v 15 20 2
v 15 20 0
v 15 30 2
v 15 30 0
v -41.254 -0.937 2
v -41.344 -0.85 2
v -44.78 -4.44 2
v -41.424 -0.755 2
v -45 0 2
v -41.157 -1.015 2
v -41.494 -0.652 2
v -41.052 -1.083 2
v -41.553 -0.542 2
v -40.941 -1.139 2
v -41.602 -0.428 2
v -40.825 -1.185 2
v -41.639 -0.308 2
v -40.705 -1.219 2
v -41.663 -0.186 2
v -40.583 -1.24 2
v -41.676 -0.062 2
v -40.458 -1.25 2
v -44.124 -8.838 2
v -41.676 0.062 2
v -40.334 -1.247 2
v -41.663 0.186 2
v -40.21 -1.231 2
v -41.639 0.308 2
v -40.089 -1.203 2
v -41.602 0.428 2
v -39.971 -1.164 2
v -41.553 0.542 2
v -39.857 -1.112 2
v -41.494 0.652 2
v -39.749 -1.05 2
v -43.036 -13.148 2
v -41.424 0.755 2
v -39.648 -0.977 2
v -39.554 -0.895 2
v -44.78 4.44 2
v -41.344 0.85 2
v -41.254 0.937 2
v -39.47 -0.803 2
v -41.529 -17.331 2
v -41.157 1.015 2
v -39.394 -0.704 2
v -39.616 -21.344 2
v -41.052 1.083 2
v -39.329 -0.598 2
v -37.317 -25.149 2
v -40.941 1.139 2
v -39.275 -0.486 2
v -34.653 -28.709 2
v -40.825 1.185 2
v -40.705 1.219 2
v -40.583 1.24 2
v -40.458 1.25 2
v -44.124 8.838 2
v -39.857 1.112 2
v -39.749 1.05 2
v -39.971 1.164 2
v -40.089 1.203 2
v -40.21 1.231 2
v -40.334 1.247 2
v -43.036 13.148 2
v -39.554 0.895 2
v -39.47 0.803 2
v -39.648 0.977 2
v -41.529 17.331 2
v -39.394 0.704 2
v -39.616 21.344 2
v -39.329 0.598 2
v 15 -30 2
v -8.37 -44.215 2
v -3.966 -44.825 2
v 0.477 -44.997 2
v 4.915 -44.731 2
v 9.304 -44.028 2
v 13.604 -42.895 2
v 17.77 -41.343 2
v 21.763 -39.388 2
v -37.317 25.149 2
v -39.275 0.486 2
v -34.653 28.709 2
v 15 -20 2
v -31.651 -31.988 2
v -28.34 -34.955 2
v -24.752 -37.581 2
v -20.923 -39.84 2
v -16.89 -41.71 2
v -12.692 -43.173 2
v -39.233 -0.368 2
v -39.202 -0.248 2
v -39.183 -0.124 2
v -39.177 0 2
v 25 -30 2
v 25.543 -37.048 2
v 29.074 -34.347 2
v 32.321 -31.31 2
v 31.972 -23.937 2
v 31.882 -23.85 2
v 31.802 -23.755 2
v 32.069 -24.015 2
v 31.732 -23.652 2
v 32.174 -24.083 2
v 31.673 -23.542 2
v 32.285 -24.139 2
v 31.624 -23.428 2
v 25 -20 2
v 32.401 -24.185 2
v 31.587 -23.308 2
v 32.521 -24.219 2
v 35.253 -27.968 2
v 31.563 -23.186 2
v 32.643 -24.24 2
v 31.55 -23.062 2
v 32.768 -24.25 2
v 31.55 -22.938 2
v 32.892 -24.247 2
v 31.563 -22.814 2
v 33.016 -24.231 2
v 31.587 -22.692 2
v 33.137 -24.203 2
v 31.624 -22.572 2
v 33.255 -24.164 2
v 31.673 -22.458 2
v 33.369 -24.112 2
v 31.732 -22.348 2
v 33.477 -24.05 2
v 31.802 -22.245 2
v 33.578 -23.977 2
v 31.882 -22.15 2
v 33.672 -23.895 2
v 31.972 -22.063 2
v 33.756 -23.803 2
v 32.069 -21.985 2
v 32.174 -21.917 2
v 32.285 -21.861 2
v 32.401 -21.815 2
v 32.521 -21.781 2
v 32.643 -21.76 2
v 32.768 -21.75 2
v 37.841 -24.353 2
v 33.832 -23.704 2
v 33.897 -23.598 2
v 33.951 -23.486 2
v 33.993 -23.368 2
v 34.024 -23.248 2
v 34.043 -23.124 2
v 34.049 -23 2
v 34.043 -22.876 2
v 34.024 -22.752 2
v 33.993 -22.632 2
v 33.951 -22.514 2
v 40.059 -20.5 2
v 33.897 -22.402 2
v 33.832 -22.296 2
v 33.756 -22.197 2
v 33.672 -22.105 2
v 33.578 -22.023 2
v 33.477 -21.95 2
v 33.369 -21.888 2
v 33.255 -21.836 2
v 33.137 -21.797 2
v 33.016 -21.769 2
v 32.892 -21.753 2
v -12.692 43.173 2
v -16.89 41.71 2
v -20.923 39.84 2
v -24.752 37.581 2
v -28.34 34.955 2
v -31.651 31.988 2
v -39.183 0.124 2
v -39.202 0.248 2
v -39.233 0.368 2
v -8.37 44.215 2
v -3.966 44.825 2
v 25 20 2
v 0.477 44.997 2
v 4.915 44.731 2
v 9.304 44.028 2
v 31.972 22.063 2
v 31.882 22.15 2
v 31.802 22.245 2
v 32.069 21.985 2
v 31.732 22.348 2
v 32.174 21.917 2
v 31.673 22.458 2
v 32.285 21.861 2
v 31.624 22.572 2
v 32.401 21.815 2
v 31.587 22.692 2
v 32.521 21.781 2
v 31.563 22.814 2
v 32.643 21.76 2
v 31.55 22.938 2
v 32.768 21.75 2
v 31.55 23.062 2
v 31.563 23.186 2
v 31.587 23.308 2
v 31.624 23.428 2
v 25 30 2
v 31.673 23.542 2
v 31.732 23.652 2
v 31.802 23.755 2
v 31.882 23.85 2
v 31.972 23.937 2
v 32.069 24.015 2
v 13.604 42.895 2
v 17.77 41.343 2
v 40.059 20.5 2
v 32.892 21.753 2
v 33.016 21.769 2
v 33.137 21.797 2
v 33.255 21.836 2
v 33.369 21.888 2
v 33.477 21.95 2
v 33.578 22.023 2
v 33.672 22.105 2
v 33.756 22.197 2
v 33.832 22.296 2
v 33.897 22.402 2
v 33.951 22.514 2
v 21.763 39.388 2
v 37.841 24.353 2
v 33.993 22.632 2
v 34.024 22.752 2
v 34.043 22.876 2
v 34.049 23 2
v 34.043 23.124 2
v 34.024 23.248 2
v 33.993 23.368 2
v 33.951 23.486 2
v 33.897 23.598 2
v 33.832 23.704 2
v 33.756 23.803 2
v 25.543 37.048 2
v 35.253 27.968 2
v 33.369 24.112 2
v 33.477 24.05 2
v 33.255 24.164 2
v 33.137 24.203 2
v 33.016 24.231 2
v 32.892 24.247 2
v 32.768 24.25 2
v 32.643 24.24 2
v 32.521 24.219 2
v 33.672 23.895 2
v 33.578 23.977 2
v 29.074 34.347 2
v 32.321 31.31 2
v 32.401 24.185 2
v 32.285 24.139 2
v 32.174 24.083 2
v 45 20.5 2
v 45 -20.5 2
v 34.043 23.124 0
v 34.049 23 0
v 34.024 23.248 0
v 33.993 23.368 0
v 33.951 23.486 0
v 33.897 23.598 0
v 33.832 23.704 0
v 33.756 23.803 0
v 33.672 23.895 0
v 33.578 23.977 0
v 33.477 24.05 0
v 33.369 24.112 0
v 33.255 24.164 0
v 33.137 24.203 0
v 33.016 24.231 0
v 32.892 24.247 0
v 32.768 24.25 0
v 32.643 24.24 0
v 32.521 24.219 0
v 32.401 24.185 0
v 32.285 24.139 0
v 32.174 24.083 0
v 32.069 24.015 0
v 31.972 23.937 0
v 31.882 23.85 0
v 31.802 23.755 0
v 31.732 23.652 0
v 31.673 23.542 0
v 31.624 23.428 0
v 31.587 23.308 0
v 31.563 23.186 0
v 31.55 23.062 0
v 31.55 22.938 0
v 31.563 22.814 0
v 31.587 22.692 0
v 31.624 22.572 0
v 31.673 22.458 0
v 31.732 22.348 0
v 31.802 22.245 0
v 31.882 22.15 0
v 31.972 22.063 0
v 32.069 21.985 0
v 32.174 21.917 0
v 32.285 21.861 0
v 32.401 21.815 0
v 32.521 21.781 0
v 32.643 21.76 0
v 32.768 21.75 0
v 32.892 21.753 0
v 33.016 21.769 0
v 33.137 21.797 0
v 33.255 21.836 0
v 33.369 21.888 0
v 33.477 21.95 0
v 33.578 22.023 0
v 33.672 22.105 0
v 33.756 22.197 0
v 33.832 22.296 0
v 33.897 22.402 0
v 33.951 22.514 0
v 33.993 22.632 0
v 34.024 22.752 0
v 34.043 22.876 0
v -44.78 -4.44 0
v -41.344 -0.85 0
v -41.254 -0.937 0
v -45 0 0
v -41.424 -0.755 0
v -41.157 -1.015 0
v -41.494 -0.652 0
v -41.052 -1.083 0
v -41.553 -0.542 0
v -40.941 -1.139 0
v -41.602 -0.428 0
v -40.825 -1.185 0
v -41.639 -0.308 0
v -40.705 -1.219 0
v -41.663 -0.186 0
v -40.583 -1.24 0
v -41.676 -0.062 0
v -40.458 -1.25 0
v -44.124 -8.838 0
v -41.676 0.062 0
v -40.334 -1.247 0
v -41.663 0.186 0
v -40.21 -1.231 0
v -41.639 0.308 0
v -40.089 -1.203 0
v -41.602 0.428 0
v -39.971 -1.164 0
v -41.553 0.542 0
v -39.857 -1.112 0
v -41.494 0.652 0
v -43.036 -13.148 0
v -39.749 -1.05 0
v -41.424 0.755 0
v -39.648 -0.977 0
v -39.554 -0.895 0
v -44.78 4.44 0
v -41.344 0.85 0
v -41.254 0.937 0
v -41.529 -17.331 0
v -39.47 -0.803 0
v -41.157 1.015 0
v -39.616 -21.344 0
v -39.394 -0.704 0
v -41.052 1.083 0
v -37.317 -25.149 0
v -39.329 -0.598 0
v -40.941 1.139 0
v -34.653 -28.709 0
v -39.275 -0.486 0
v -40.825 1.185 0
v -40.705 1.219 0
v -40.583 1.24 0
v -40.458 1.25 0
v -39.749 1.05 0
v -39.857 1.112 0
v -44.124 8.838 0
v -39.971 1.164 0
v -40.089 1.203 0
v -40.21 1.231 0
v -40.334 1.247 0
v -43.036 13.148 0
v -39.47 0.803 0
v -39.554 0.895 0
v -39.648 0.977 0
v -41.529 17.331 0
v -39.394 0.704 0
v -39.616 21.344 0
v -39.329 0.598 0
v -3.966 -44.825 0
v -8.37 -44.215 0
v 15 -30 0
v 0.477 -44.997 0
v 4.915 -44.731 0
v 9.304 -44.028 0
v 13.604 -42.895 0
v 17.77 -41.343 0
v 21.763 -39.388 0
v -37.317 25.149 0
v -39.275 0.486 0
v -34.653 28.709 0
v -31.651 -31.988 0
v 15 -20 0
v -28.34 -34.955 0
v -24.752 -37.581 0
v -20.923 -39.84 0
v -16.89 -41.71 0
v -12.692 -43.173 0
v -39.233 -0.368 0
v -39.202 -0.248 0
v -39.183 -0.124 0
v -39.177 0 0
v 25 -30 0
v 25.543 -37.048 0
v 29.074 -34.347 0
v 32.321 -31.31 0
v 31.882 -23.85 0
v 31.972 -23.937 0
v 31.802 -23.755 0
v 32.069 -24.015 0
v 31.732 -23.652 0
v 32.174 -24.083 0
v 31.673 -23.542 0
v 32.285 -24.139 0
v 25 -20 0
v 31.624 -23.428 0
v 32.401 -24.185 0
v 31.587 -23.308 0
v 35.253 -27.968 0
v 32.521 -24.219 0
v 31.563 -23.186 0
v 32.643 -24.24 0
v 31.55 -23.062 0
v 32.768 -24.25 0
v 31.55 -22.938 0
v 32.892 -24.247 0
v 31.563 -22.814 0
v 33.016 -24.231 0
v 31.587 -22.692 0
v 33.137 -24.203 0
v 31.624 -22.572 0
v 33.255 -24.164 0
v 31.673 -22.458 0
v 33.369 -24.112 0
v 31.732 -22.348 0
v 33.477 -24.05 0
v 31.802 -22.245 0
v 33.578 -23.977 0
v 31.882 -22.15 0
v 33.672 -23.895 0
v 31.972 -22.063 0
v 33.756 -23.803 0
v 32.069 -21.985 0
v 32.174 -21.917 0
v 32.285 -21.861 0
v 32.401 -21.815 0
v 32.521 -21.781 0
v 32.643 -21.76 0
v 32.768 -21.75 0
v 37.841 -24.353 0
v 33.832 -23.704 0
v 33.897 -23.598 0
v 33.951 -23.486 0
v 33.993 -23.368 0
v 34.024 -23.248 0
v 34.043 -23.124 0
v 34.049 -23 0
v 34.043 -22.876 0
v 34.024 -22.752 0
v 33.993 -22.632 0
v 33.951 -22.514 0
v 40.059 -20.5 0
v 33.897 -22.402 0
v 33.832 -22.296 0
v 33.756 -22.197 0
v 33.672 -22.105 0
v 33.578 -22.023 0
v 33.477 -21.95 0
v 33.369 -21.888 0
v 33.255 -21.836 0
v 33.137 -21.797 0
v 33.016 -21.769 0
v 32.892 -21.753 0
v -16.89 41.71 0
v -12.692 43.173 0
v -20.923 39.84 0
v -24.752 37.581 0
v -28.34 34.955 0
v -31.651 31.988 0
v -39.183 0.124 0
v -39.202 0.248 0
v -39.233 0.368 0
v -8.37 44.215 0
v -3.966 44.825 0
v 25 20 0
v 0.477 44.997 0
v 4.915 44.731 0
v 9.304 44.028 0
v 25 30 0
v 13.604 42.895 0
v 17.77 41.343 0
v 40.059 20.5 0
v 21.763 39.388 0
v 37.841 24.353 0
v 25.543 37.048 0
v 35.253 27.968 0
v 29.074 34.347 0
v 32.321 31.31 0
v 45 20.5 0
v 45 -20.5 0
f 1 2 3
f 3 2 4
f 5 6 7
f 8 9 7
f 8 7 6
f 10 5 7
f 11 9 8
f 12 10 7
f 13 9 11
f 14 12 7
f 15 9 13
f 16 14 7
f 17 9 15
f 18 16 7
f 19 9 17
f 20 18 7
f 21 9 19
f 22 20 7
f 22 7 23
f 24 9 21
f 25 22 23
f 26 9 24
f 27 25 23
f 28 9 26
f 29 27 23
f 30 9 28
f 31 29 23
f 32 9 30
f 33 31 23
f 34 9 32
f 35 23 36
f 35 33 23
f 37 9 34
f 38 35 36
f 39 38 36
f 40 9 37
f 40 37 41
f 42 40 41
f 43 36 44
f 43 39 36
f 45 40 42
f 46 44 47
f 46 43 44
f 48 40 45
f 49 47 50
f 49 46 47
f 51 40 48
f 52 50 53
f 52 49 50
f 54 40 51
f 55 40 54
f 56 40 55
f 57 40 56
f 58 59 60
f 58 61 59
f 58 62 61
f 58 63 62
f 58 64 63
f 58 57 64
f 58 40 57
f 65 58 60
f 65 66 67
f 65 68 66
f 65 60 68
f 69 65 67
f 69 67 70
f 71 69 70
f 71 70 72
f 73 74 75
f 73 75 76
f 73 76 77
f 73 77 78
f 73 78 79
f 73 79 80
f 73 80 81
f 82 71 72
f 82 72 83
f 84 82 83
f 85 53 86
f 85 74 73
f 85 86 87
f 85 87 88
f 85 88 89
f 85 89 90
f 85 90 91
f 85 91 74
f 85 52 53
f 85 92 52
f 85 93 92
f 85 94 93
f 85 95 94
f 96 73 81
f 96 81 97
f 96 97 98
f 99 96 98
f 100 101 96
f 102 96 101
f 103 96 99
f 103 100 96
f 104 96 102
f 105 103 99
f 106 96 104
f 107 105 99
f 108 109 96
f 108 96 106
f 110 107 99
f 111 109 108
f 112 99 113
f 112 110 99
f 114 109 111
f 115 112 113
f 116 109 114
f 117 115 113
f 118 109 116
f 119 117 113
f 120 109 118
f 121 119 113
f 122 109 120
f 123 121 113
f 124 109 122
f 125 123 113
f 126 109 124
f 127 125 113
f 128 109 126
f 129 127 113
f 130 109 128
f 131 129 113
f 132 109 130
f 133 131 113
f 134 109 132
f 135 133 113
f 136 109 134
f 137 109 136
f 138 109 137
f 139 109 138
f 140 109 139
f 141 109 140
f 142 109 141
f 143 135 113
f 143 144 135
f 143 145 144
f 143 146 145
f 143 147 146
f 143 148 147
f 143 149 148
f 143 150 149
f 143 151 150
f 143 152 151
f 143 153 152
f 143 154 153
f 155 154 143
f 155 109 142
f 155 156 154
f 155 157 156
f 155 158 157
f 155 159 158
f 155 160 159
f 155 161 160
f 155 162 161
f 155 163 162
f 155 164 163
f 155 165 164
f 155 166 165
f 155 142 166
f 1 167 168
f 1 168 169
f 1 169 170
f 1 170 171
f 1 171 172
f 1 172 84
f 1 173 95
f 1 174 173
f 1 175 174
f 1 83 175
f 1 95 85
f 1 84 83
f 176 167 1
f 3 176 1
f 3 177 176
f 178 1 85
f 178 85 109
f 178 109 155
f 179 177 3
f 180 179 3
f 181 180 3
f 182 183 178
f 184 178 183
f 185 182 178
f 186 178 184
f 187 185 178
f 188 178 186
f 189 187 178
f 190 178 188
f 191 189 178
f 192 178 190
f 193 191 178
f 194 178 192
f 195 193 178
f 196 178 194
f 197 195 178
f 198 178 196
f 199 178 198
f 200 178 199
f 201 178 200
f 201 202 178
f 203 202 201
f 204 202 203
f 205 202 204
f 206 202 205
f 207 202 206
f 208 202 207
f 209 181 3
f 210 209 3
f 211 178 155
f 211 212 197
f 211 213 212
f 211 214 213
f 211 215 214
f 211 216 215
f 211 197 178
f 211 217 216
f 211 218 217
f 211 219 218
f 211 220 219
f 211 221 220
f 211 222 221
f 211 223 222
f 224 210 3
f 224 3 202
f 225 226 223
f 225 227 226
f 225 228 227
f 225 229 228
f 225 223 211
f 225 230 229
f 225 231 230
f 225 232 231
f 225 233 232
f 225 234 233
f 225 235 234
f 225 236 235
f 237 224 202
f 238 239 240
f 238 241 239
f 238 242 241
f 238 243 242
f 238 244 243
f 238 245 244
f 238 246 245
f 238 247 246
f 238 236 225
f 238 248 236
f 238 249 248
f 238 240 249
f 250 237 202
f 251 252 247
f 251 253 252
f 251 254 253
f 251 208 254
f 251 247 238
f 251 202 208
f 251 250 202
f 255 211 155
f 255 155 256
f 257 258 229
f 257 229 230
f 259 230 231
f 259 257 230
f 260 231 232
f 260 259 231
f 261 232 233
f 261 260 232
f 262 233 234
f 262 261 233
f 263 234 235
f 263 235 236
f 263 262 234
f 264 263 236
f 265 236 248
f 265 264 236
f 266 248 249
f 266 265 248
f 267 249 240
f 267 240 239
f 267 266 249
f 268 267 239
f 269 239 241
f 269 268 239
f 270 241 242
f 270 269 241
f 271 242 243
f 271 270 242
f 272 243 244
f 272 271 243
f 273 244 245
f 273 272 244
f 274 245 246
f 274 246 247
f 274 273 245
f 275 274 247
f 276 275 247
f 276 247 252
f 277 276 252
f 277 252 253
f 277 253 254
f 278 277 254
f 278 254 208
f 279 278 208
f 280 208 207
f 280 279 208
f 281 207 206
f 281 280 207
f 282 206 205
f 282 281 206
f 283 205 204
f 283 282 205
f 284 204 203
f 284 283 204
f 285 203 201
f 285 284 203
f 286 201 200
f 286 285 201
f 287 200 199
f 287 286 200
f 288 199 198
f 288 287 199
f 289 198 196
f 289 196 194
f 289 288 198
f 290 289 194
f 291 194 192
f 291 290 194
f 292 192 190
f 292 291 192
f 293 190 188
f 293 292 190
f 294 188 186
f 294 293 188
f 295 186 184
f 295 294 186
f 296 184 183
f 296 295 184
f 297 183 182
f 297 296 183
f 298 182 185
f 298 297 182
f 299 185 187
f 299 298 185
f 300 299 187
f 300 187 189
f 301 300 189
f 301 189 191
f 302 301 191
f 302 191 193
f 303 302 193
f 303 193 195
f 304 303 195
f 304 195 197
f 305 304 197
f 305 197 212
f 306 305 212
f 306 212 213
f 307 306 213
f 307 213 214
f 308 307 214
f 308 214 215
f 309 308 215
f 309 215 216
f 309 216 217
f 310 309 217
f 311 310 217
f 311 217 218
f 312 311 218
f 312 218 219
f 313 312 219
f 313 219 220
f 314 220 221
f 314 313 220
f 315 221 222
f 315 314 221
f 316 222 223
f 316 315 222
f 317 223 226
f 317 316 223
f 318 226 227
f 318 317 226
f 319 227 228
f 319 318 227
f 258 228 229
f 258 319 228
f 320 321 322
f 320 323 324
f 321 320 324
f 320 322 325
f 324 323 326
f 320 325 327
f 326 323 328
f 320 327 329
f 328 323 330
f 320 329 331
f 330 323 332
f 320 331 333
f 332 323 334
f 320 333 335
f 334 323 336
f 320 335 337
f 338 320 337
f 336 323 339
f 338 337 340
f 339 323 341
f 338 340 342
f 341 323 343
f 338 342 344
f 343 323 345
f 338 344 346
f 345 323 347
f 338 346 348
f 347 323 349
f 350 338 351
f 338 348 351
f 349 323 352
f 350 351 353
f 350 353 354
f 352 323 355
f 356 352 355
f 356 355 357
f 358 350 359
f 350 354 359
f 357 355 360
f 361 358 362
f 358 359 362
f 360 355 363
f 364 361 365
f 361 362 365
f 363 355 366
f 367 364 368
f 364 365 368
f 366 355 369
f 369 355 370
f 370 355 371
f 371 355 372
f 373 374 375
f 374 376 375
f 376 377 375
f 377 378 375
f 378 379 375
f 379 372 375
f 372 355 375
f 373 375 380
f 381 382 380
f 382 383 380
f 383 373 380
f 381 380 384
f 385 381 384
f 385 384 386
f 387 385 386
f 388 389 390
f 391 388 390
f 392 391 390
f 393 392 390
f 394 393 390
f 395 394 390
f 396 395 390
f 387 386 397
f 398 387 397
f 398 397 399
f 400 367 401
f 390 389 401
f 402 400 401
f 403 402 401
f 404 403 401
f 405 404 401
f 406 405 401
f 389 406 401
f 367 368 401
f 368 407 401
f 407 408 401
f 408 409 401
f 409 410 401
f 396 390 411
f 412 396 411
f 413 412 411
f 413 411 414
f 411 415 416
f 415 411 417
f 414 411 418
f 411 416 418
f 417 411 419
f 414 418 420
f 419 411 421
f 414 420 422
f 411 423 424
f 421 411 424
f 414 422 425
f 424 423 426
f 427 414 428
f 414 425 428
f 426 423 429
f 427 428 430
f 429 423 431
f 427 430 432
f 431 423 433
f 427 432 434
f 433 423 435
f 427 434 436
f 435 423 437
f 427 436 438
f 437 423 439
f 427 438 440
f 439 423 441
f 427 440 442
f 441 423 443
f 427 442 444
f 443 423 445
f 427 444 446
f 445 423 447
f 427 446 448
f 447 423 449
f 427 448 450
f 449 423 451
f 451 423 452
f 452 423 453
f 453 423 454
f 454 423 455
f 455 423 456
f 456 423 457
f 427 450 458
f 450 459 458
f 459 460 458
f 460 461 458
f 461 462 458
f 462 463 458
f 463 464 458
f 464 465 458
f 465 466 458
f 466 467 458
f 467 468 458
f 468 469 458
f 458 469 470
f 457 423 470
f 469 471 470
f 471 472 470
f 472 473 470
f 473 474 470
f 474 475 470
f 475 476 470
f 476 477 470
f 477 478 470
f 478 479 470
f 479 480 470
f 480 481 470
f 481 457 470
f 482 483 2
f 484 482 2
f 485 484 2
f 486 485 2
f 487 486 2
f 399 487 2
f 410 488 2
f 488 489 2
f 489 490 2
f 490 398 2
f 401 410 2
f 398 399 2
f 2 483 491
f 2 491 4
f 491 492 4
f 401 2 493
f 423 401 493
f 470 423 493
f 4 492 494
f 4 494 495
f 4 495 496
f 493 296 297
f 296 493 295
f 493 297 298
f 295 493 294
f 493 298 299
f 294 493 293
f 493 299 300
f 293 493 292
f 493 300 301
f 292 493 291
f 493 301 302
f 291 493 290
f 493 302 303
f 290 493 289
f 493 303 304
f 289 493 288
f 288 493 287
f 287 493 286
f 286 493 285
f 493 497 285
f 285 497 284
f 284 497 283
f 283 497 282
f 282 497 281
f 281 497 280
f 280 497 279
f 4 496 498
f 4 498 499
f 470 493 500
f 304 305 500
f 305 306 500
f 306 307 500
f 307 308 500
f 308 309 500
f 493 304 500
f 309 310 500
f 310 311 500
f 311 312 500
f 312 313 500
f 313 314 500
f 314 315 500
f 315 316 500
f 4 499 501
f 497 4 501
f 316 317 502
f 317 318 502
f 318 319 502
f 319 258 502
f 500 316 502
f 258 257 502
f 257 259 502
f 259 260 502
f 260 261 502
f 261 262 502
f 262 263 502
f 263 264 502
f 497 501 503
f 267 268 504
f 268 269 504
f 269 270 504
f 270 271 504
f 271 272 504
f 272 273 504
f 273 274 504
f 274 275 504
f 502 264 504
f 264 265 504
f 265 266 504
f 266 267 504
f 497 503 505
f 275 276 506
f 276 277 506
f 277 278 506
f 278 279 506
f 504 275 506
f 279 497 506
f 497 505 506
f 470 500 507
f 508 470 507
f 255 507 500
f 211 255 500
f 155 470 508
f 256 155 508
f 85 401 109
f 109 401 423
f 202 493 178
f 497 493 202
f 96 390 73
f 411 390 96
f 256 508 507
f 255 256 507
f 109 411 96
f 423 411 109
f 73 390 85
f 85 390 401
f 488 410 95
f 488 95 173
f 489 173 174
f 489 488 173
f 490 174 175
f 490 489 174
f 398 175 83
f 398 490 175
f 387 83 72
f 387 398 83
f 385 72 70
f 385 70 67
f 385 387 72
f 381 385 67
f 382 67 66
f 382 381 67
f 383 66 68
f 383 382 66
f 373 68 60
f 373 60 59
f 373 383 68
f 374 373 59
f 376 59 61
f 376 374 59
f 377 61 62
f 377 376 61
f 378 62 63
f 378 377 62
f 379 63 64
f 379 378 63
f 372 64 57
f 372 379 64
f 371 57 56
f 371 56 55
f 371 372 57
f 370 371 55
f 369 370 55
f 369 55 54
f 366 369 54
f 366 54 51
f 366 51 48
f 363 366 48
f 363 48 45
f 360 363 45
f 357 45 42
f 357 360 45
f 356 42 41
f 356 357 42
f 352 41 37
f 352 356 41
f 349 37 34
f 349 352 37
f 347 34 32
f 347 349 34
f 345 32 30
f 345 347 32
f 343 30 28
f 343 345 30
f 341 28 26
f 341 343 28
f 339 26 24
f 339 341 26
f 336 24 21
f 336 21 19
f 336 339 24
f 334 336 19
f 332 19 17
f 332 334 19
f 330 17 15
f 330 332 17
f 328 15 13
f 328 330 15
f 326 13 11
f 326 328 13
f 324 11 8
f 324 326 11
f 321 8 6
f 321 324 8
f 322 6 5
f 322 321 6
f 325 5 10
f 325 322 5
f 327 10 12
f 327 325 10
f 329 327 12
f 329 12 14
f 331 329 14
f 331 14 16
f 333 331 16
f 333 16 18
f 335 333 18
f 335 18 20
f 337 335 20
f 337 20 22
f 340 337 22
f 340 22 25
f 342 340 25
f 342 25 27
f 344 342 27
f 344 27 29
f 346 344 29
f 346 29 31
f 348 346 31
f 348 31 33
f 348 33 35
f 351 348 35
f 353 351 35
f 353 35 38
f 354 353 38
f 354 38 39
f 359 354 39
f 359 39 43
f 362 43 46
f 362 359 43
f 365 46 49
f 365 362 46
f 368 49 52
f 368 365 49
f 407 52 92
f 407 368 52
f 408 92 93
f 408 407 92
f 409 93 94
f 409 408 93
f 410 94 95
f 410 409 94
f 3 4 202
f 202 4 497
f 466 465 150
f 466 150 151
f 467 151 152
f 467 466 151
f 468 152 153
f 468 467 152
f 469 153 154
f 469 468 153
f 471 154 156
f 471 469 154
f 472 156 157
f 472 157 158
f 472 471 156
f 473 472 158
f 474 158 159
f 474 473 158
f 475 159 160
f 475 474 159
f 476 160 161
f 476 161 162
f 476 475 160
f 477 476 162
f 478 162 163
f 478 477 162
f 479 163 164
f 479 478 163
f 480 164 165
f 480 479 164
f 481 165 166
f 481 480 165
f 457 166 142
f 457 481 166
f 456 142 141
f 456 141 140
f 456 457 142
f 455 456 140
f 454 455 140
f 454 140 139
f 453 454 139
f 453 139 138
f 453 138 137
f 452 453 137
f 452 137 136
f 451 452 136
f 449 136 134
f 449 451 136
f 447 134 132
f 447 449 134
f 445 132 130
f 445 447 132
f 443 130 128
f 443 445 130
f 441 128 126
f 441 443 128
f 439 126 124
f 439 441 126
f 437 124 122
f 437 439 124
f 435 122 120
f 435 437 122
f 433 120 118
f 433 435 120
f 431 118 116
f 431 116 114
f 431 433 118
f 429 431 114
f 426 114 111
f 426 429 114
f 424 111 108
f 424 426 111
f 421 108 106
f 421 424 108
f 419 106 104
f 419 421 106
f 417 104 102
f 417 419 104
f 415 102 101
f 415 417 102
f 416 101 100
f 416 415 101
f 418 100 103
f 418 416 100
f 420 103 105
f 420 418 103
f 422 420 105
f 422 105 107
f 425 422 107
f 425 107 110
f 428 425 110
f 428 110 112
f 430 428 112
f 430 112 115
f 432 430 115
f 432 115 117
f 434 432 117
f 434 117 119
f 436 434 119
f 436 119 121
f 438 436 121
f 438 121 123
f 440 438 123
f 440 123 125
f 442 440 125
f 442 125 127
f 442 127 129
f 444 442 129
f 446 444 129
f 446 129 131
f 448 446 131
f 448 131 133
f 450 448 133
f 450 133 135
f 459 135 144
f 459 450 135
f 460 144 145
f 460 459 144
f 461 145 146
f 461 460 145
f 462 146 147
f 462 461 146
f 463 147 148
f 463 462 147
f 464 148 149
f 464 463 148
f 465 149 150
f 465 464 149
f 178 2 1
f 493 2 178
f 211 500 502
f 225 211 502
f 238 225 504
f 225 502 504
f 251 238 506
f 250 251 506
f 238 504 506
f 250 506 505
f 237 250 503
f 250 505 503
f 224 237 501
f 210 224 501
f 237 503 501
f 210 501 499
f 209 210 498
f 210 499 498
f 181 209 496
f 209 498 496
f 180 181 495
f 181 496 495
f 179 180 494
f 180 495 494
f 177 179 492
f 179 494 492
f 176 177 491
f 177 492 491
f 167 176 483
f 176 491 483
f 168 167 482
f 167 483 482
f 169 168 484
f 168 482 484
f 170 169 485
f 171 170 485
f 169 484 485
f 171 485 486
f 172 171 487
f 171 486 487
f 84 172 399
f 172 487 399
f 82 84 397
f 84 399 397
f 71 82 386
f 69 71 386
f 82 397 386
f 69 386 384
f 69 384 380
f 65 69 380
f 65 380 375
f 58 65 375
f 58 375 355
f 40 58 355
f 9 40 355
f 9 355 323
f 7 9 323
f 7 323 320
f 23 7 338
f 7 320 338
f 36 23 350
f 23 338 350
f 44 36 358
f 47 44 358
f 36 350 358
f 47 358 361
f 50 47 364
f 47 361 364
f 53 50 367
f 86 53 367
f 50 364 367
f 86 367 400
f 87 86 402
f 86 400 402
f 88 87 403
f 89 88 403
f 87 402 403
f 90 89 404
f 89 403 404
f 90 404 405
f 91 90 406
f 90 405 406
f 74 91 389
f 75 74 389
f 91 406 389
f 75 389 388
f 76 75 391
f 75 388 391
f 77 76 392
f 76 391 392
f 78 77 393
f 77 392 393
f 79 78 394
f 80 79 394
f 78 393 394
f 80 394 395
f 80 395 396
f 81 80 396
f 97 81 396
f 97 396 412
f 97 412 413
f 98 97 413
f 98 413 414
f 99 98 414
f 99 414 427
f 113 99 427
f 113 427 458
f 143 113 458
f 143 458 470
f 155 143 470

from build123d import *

# Parameters (mm, degrees)
SKETCH1_R  = 1.25
SKETCH1_W  = 10
SKETCH1_H  = 10
BODY_DEPTH = 2


with BuildPart() as part:
    # Sketch1 → Body (new body)
    with BuildSketch(Plane.XY):
        with BuildLine():
            Line((45, 20.5), (40.059330998, 20.5))
            ThreePointArc((40.059330998, 20.5), (-45, 0), (40.059330998, -20.5))
            Line((40.059330998, -20.5), (45, -20.5))
            Line((45, -20.5), (45, 20.5))
        make_face()
        with Locations((-40.427264064, 0)):
            Circle(SKETCH1_R, mode=Mode.SUBTRACT)
        with Locations((32.798809505, -23)):
            Circle(SKETCH1_R, mode=Mode.SUBTRACT)
        with Locations((32.798809505, 23)):
            Circle(SKETCH1_R, mode=Mode.SUBTRACT)
        with Locations((20, 25)):
            Rectangle(SKETCH1_W, SKETCH1_H, mode=Mode.SUBTRACT)
        with Locations((20, -25)):
            Rectangle(SKETCH1_W, SKETCH1_H, mode=Mode.SUBTRACT)
    extrude(amount=BODY_DEPTH)


solid = part.part
